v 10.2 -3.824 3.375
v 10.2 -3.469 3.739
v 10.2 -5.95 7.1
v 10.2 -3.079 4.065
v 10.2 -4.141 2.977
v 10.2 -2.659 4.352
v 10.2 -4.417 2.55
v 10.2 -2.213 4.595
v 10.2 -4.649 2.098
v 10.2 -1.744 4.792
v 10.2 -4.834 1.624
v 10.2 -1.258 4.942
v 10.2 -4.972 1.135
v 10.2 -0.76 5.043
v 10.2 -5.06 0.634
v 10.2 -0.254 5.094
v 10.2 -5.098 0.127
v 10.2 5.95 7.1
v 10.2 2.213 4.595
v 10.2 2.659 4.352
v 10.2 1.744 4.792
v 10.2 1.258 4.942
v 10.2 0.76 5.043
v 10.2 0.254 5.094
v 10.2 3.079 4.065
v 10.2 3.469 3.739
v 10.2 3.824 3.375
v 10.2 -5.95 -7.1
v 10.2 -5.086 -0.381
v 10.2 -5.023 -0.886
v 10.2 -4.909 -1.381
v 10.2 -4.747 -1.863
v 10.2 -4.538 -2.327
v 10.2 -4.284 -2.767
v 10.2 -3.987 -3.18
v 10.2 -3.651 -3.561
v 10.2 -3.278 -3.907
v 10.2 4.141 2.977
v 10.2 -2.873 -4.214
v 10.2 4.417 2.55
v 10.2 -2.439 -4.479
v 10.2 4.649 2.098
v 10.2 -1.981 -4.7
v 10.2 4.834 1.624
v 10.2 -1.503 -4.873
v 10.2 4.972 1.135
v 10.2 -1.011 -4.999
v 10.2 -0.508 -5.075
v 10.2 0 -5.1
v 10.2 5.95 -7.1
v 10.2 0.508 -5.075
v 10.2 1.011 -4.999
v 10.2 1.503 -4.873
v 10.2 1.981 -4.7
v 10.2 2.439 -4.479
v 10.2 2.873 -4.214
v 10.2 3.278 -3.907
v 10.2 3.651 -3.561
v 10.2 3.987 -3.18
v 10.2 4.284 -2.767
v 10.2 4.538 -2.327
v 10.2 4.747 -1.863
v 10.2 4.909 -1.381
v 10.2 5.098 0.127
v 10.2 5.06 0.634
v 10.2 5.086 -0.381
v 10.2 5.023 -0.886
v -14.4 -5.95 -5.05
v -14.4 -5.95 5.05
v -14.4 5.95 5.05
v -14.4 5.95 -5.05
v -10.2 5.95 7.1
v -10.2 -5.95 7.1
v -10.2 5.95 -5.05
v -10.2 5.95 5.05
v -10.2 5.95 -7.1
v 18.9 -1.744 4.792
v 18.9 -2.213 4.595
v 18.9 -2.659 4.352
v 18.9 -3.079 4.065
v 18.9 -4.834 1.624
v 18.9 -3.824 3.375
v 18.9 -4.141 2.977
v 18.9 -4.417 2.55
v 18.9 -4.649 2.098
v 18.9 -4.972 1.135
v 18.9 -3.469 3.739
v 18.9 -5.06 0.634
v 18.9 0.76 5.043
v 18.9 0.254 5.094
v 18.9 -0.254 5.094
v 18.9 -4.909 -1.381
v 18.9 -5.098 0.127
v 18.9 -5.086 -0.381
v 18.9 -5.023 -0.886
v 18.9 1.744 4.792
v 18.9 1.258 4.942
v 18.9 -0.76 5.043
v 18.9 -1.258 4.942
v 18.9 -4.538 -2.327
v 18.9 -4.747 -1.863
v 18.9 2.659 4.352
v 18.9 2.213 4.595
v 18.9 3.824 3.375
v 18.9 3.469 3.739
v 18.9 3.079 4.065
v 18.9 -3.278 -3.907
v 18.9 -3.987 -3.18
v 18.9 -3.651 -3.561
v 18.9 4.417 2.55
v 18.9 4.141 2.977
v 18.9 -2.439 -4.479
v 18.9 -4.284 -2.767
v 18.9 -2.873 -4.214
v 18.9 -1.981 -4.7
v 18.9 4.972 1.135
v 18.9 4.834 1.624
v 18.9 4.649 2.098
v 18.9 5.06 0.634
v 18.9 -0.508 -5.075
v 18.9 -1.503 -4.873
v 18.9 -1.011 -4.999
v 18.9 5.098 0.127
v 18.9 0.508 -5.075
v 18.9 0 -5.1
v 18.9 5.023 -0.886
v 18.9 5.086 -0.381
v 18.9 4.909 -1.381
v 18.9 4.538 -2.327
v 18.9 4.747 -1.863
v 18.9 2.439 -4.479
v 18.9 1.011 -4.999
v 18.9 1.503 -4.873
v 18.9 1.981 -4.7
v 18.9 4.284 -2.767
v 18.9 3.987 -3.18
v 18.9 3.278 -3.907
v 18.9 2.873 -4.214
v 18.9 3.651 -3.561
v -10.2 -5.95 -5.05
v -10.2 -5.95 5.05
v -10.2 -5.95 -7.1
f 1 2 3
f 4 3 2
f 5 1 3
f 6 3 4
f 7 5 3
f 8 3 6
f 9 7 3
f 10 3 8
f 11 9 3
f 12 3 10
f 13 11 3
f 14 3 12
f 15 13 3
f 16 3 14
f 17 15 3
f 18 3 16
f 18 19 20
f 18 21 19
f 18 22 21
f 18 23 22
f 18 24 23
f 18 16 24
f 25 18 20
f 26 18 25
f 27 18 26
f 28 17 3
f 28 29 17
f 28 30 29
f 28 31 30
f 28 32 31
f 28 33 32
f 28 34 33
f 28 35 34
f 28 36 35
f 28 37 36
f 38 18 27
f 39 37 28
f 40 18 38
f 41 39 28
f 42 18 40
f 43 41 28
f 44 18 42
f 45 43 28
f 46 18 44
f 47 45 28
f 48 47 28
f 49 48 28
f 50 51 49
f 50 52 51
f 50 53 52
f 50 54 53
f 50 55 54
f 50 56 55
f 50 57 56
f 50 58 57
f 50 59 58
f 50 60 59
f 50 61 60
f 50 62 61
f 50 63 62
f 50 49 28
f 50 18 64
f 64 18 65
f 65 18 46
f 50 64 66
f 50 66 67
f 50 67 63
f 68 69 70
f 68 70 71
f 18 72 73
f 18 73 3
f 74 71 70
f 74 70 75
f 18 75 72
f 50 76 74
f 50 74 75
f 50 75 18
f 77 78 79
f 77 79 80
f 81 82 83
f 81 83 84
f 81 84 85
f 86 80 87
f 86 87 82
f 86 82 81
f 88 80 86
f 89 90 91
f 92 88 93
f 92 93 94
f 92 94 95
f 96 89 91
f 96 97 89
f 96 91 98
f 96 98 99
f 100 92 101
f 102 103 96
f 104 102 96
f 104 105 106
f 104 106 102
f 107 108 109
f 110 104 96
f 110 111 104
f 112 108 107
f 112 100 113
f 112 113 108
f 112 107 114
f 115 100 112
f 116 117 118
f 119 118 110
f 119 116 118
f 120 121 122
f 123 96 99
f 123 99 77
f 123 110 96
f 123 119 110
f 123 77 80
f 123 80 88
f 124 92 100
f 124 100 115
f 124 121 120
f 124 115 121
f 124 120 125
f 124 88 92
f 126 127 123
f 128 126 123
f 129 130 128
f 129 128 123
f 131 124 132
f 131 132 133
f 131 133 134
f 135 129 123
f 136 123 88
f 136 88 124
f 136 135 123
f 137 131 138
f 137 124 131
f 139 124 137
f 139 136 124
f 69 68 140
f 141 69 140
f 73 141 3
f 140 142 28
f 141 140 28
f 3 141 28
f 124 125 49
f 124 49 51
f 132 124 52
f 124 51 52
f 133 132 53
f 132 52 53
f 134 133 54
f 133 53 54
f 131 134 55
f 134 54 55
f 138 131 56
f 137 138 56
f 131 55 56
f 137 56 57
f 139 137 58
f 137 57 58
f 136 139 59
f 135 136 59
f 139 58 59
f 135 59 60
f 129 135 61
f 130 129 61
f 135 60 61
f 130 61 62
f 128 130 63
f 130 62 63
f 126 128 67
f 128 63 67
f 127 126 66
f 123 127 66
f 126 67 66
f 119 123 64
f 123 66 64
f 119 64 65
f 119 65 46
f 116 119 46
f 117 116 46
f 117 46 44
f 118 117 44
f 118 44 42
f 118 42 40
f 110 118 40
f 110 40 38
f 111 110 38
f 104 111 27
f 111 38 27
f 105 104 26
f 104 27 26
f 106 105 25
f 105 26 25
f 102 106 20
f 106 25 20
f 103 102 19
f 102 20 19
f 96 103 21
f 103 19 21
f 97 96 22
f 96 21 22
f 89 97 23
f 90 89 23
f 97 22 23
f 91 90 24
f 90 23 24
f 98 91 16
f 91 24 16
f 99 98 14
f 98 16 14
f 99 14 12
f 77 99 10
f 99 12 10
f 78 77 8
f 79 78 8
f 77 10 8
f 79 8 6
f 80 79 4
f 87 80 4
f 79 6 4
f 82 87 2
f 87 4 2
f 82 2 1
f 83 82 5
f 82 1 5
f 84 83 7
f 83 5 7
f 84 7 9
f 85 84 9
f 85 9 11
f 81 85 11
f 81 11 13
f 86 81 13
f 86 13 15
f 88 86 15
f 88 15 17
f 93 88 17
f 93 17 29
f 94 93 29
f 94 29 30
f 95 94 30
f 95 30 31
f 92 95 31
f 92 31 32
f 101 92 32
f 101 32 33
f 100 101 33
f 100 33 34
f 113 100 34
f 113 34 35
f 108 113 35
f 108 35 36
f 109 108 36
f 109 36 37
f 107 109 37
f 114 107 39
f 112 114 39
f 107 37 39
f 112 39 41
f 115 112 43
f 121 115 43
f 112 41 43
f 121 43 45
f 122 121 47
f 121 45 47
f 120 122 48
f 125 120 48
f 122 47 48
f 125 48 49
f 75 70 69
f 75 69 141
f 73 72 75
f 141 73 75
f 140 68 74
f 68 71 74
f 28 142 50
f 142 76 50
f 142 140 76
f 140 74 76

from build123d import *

# Parameters (mm, degrees)
SKETCH1_W           = 4.2
SKETCH1_H           = 10.1
SKETCH1_W_2         = 20.4
SKETCH1_H_2         = 14.2
BOSS_EXTRUDE1_DEPTH = 5.95
SKETCH2_R           = 5.1
BOSS_EXTRUDE2_DEPTH = 8.7


with BuildPart() as part:
    # Sketch1 → Boss-Extrude1 (new, symmetric)
    with BuildSketch(Plane(origin=(0, 0, 0), x_dir=(1, 0, 0), z_dir=(0, 1, 0))):
        with Locations((-12.3, 0)):
            Rectangle(SKETCH1_W, SKETCH1_H)
        Rectangle(SKETCH1_W_2, SKETCH1_H_2)
    extrude(amount=BOSS_EXTRUDE1_DEPTH, both=True)

    # Sketch2 → Boss-Extrude2 (add)
    with BuildSketch(Plane(origin=(10.2, 0, 0), x_dir=(0, 0, -1), z_dir=(1, 0, 0))):
        Circle(SKETCH2_R)
    extrude(amount=BOSS_EXTRUDE2_DEPTH)


solid = part.part
